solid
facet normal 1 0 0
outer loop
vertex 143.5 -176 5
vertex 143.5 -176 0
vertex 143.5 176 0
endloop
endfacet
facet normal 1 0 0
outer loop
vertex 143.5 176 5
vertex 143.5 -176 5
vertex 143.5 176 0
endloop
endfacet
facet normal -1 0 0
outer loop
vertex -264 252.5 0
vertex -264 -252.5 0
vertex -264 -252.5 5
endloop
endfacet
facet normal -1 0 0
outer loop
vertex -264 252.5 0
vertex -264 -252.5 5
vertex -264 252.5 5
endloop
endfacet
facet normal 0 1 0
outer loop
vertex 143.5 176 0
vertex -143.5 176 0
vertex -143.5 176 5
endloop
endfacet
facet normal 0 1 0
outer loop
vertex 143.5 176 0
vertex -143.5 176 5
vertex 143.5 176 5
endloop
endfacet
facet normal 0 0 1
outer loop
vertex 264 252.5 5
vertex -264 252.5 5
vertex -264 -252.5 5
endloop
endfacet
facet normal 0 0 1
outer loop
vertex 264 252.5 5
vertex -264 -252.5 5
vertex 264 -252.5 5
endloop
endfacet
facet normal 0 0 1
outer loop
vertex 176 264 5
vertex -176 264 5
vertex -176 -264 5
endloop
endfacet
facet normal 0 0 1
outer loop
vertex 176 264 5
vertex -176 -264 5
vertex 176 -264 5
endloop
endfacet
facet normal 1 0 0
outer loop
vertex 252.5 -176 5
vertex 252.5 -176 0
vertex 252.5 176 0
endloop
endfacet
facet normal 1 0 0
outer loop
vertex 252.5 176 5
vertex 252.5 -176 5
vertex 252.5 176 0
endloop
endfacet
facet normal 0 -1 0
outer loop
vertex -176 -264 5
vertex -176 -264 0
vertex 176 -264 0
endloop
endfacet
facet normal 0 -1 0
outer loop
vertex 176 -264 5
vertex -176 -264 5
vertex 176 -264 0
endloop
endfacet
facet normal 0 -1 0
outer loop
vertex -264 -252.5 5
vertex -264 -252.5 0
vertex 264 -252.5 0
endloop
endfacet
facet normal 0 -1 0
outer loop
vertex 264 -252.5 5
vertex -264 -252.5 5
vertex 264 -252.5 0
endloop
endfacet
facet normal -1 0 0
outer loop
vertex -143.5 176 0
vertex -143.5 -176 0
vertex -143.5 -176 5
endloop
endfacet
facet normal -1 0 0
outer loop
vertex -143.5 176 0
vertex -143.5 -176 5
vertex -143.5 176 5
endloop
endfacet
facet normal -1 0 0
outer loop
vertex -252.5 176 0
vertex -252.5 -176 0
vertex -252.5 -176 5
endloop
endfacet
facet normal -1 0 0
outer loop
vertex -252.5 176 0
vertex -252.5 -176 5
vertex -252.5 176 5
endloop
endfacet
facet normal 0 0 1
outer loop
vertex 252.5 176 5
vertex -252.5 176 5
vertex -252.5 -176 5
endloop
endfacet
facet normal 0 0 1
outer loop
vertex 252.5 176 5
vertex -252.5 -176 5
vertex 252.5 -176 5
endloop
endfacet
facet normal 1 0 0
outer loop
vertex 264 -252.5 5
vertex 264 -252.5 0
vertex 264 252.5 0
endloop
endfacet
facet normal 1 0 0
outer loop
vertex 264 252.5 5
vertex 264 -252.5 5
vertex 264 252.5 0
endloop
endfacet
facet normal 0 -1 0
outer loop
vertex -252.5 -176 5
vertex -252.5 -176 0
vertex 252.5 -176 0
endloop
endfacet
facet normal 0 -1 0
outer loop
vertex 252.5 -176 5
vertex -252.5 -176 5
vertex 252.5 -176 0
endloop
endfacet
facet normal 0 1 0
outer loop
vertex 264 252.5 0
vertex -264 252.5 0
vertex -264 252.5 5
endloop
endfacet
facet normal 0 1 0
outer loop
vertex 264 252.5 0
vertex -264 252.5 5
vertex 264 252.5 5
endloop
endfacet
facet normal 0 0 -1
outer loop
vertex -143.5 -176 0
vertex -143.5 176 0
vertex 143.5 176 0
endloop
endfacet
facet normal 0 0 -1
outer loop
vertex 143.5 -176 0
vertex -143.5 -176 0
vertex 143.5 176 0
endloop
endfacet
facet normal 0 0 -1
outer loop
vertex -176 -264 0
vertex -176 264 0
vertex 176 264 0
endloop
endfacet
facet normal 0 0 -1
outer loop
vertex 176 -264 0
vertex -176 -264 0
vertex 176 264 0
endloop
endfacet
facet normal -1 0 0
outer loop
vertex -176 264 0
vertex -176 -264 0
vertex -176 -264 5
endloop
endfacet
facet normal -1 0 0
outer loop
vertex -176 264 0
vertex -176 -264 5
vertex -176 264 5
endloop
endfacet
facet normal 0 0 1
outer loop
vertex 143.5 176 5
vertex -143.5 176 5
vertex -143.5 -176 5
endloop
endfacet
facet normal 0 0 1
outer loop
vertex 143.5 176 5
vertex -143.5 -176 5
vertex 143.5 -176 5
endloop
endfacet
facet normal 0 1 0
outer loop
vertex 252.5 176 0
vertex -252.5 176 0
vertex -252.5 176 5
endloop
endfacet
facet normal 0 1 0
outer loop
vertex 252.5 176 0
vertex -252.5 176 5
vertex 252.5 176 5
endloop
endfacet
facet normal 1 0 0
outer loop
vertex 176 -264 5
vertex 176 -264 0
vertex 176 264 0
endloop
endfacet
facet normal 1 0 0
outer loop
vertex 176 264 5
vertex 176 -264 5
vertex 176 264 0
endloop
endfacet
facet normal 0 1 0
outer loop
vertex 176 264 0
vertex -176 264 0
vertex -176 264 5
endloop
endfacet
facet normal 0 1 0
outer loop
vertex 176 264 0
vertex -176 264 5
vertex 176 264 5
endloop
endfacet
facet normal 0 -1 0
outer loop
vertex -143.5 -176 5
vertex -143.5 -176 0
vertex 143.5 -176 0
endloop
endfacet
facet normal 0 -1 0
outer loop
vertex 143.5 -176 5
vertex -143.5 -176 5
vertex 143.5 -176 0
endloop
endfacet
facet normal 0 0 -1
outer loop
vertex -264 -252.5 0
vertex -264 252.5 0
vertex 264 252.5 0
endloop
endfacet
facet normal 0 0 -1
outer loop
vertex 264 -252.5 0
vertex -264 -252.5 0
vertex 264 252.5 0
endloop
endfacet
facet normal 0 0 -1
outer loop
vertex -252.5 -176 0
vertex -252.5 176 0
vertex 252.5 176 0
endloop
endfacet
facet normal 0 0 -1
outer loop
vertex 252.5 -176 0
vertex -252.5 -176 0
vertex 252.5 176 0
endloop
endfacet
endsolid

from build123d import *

# Parameters (mm, degrees)
F0_W     = 505
F0_H     = 352
F1_DEPTH = 5
F2_W     = 528
F2_H     = 505
F3_DEPTH = 5
F4_W     = 352
F4_H     = 528
F5_DEPTH = 5
F6_W     = 287
F6_H     = 352
F7_DEPTH = 5


with BuildPart() as f1:
    # F0 (on Top) → F1 (new body)
    with BuildSketch(Plane.XY):
        Rectangle(F0_W, F0_H)
    extrude(amount=F1_DEPTH)


with BuildPart() as f3:
    # F2 (on Top) → F3 (new body)
    with BuildSketch(Plane.XY):
        Rectangle(F2_W, F2_H)
    extrude(amount=F3_DEPTH)


with BuildPart() as f5:
    # F4 (on Top) → F5 (new body)
    with BuildSketch(Plane.XY):
        Rectangle(F4_W, F4_H)
    extrude(amount=F5_DEPTH)


with BuildPart() as f7:
    # F6 (on Top) → F7 (new body)
    with BuildSketch(Plane.XY):
        Rectangle(F6_W, F6_H)
    extrude(amount=F7_DEPTH)


solid = Compound([f1.part, f3.part, f5.part, f7.part])
